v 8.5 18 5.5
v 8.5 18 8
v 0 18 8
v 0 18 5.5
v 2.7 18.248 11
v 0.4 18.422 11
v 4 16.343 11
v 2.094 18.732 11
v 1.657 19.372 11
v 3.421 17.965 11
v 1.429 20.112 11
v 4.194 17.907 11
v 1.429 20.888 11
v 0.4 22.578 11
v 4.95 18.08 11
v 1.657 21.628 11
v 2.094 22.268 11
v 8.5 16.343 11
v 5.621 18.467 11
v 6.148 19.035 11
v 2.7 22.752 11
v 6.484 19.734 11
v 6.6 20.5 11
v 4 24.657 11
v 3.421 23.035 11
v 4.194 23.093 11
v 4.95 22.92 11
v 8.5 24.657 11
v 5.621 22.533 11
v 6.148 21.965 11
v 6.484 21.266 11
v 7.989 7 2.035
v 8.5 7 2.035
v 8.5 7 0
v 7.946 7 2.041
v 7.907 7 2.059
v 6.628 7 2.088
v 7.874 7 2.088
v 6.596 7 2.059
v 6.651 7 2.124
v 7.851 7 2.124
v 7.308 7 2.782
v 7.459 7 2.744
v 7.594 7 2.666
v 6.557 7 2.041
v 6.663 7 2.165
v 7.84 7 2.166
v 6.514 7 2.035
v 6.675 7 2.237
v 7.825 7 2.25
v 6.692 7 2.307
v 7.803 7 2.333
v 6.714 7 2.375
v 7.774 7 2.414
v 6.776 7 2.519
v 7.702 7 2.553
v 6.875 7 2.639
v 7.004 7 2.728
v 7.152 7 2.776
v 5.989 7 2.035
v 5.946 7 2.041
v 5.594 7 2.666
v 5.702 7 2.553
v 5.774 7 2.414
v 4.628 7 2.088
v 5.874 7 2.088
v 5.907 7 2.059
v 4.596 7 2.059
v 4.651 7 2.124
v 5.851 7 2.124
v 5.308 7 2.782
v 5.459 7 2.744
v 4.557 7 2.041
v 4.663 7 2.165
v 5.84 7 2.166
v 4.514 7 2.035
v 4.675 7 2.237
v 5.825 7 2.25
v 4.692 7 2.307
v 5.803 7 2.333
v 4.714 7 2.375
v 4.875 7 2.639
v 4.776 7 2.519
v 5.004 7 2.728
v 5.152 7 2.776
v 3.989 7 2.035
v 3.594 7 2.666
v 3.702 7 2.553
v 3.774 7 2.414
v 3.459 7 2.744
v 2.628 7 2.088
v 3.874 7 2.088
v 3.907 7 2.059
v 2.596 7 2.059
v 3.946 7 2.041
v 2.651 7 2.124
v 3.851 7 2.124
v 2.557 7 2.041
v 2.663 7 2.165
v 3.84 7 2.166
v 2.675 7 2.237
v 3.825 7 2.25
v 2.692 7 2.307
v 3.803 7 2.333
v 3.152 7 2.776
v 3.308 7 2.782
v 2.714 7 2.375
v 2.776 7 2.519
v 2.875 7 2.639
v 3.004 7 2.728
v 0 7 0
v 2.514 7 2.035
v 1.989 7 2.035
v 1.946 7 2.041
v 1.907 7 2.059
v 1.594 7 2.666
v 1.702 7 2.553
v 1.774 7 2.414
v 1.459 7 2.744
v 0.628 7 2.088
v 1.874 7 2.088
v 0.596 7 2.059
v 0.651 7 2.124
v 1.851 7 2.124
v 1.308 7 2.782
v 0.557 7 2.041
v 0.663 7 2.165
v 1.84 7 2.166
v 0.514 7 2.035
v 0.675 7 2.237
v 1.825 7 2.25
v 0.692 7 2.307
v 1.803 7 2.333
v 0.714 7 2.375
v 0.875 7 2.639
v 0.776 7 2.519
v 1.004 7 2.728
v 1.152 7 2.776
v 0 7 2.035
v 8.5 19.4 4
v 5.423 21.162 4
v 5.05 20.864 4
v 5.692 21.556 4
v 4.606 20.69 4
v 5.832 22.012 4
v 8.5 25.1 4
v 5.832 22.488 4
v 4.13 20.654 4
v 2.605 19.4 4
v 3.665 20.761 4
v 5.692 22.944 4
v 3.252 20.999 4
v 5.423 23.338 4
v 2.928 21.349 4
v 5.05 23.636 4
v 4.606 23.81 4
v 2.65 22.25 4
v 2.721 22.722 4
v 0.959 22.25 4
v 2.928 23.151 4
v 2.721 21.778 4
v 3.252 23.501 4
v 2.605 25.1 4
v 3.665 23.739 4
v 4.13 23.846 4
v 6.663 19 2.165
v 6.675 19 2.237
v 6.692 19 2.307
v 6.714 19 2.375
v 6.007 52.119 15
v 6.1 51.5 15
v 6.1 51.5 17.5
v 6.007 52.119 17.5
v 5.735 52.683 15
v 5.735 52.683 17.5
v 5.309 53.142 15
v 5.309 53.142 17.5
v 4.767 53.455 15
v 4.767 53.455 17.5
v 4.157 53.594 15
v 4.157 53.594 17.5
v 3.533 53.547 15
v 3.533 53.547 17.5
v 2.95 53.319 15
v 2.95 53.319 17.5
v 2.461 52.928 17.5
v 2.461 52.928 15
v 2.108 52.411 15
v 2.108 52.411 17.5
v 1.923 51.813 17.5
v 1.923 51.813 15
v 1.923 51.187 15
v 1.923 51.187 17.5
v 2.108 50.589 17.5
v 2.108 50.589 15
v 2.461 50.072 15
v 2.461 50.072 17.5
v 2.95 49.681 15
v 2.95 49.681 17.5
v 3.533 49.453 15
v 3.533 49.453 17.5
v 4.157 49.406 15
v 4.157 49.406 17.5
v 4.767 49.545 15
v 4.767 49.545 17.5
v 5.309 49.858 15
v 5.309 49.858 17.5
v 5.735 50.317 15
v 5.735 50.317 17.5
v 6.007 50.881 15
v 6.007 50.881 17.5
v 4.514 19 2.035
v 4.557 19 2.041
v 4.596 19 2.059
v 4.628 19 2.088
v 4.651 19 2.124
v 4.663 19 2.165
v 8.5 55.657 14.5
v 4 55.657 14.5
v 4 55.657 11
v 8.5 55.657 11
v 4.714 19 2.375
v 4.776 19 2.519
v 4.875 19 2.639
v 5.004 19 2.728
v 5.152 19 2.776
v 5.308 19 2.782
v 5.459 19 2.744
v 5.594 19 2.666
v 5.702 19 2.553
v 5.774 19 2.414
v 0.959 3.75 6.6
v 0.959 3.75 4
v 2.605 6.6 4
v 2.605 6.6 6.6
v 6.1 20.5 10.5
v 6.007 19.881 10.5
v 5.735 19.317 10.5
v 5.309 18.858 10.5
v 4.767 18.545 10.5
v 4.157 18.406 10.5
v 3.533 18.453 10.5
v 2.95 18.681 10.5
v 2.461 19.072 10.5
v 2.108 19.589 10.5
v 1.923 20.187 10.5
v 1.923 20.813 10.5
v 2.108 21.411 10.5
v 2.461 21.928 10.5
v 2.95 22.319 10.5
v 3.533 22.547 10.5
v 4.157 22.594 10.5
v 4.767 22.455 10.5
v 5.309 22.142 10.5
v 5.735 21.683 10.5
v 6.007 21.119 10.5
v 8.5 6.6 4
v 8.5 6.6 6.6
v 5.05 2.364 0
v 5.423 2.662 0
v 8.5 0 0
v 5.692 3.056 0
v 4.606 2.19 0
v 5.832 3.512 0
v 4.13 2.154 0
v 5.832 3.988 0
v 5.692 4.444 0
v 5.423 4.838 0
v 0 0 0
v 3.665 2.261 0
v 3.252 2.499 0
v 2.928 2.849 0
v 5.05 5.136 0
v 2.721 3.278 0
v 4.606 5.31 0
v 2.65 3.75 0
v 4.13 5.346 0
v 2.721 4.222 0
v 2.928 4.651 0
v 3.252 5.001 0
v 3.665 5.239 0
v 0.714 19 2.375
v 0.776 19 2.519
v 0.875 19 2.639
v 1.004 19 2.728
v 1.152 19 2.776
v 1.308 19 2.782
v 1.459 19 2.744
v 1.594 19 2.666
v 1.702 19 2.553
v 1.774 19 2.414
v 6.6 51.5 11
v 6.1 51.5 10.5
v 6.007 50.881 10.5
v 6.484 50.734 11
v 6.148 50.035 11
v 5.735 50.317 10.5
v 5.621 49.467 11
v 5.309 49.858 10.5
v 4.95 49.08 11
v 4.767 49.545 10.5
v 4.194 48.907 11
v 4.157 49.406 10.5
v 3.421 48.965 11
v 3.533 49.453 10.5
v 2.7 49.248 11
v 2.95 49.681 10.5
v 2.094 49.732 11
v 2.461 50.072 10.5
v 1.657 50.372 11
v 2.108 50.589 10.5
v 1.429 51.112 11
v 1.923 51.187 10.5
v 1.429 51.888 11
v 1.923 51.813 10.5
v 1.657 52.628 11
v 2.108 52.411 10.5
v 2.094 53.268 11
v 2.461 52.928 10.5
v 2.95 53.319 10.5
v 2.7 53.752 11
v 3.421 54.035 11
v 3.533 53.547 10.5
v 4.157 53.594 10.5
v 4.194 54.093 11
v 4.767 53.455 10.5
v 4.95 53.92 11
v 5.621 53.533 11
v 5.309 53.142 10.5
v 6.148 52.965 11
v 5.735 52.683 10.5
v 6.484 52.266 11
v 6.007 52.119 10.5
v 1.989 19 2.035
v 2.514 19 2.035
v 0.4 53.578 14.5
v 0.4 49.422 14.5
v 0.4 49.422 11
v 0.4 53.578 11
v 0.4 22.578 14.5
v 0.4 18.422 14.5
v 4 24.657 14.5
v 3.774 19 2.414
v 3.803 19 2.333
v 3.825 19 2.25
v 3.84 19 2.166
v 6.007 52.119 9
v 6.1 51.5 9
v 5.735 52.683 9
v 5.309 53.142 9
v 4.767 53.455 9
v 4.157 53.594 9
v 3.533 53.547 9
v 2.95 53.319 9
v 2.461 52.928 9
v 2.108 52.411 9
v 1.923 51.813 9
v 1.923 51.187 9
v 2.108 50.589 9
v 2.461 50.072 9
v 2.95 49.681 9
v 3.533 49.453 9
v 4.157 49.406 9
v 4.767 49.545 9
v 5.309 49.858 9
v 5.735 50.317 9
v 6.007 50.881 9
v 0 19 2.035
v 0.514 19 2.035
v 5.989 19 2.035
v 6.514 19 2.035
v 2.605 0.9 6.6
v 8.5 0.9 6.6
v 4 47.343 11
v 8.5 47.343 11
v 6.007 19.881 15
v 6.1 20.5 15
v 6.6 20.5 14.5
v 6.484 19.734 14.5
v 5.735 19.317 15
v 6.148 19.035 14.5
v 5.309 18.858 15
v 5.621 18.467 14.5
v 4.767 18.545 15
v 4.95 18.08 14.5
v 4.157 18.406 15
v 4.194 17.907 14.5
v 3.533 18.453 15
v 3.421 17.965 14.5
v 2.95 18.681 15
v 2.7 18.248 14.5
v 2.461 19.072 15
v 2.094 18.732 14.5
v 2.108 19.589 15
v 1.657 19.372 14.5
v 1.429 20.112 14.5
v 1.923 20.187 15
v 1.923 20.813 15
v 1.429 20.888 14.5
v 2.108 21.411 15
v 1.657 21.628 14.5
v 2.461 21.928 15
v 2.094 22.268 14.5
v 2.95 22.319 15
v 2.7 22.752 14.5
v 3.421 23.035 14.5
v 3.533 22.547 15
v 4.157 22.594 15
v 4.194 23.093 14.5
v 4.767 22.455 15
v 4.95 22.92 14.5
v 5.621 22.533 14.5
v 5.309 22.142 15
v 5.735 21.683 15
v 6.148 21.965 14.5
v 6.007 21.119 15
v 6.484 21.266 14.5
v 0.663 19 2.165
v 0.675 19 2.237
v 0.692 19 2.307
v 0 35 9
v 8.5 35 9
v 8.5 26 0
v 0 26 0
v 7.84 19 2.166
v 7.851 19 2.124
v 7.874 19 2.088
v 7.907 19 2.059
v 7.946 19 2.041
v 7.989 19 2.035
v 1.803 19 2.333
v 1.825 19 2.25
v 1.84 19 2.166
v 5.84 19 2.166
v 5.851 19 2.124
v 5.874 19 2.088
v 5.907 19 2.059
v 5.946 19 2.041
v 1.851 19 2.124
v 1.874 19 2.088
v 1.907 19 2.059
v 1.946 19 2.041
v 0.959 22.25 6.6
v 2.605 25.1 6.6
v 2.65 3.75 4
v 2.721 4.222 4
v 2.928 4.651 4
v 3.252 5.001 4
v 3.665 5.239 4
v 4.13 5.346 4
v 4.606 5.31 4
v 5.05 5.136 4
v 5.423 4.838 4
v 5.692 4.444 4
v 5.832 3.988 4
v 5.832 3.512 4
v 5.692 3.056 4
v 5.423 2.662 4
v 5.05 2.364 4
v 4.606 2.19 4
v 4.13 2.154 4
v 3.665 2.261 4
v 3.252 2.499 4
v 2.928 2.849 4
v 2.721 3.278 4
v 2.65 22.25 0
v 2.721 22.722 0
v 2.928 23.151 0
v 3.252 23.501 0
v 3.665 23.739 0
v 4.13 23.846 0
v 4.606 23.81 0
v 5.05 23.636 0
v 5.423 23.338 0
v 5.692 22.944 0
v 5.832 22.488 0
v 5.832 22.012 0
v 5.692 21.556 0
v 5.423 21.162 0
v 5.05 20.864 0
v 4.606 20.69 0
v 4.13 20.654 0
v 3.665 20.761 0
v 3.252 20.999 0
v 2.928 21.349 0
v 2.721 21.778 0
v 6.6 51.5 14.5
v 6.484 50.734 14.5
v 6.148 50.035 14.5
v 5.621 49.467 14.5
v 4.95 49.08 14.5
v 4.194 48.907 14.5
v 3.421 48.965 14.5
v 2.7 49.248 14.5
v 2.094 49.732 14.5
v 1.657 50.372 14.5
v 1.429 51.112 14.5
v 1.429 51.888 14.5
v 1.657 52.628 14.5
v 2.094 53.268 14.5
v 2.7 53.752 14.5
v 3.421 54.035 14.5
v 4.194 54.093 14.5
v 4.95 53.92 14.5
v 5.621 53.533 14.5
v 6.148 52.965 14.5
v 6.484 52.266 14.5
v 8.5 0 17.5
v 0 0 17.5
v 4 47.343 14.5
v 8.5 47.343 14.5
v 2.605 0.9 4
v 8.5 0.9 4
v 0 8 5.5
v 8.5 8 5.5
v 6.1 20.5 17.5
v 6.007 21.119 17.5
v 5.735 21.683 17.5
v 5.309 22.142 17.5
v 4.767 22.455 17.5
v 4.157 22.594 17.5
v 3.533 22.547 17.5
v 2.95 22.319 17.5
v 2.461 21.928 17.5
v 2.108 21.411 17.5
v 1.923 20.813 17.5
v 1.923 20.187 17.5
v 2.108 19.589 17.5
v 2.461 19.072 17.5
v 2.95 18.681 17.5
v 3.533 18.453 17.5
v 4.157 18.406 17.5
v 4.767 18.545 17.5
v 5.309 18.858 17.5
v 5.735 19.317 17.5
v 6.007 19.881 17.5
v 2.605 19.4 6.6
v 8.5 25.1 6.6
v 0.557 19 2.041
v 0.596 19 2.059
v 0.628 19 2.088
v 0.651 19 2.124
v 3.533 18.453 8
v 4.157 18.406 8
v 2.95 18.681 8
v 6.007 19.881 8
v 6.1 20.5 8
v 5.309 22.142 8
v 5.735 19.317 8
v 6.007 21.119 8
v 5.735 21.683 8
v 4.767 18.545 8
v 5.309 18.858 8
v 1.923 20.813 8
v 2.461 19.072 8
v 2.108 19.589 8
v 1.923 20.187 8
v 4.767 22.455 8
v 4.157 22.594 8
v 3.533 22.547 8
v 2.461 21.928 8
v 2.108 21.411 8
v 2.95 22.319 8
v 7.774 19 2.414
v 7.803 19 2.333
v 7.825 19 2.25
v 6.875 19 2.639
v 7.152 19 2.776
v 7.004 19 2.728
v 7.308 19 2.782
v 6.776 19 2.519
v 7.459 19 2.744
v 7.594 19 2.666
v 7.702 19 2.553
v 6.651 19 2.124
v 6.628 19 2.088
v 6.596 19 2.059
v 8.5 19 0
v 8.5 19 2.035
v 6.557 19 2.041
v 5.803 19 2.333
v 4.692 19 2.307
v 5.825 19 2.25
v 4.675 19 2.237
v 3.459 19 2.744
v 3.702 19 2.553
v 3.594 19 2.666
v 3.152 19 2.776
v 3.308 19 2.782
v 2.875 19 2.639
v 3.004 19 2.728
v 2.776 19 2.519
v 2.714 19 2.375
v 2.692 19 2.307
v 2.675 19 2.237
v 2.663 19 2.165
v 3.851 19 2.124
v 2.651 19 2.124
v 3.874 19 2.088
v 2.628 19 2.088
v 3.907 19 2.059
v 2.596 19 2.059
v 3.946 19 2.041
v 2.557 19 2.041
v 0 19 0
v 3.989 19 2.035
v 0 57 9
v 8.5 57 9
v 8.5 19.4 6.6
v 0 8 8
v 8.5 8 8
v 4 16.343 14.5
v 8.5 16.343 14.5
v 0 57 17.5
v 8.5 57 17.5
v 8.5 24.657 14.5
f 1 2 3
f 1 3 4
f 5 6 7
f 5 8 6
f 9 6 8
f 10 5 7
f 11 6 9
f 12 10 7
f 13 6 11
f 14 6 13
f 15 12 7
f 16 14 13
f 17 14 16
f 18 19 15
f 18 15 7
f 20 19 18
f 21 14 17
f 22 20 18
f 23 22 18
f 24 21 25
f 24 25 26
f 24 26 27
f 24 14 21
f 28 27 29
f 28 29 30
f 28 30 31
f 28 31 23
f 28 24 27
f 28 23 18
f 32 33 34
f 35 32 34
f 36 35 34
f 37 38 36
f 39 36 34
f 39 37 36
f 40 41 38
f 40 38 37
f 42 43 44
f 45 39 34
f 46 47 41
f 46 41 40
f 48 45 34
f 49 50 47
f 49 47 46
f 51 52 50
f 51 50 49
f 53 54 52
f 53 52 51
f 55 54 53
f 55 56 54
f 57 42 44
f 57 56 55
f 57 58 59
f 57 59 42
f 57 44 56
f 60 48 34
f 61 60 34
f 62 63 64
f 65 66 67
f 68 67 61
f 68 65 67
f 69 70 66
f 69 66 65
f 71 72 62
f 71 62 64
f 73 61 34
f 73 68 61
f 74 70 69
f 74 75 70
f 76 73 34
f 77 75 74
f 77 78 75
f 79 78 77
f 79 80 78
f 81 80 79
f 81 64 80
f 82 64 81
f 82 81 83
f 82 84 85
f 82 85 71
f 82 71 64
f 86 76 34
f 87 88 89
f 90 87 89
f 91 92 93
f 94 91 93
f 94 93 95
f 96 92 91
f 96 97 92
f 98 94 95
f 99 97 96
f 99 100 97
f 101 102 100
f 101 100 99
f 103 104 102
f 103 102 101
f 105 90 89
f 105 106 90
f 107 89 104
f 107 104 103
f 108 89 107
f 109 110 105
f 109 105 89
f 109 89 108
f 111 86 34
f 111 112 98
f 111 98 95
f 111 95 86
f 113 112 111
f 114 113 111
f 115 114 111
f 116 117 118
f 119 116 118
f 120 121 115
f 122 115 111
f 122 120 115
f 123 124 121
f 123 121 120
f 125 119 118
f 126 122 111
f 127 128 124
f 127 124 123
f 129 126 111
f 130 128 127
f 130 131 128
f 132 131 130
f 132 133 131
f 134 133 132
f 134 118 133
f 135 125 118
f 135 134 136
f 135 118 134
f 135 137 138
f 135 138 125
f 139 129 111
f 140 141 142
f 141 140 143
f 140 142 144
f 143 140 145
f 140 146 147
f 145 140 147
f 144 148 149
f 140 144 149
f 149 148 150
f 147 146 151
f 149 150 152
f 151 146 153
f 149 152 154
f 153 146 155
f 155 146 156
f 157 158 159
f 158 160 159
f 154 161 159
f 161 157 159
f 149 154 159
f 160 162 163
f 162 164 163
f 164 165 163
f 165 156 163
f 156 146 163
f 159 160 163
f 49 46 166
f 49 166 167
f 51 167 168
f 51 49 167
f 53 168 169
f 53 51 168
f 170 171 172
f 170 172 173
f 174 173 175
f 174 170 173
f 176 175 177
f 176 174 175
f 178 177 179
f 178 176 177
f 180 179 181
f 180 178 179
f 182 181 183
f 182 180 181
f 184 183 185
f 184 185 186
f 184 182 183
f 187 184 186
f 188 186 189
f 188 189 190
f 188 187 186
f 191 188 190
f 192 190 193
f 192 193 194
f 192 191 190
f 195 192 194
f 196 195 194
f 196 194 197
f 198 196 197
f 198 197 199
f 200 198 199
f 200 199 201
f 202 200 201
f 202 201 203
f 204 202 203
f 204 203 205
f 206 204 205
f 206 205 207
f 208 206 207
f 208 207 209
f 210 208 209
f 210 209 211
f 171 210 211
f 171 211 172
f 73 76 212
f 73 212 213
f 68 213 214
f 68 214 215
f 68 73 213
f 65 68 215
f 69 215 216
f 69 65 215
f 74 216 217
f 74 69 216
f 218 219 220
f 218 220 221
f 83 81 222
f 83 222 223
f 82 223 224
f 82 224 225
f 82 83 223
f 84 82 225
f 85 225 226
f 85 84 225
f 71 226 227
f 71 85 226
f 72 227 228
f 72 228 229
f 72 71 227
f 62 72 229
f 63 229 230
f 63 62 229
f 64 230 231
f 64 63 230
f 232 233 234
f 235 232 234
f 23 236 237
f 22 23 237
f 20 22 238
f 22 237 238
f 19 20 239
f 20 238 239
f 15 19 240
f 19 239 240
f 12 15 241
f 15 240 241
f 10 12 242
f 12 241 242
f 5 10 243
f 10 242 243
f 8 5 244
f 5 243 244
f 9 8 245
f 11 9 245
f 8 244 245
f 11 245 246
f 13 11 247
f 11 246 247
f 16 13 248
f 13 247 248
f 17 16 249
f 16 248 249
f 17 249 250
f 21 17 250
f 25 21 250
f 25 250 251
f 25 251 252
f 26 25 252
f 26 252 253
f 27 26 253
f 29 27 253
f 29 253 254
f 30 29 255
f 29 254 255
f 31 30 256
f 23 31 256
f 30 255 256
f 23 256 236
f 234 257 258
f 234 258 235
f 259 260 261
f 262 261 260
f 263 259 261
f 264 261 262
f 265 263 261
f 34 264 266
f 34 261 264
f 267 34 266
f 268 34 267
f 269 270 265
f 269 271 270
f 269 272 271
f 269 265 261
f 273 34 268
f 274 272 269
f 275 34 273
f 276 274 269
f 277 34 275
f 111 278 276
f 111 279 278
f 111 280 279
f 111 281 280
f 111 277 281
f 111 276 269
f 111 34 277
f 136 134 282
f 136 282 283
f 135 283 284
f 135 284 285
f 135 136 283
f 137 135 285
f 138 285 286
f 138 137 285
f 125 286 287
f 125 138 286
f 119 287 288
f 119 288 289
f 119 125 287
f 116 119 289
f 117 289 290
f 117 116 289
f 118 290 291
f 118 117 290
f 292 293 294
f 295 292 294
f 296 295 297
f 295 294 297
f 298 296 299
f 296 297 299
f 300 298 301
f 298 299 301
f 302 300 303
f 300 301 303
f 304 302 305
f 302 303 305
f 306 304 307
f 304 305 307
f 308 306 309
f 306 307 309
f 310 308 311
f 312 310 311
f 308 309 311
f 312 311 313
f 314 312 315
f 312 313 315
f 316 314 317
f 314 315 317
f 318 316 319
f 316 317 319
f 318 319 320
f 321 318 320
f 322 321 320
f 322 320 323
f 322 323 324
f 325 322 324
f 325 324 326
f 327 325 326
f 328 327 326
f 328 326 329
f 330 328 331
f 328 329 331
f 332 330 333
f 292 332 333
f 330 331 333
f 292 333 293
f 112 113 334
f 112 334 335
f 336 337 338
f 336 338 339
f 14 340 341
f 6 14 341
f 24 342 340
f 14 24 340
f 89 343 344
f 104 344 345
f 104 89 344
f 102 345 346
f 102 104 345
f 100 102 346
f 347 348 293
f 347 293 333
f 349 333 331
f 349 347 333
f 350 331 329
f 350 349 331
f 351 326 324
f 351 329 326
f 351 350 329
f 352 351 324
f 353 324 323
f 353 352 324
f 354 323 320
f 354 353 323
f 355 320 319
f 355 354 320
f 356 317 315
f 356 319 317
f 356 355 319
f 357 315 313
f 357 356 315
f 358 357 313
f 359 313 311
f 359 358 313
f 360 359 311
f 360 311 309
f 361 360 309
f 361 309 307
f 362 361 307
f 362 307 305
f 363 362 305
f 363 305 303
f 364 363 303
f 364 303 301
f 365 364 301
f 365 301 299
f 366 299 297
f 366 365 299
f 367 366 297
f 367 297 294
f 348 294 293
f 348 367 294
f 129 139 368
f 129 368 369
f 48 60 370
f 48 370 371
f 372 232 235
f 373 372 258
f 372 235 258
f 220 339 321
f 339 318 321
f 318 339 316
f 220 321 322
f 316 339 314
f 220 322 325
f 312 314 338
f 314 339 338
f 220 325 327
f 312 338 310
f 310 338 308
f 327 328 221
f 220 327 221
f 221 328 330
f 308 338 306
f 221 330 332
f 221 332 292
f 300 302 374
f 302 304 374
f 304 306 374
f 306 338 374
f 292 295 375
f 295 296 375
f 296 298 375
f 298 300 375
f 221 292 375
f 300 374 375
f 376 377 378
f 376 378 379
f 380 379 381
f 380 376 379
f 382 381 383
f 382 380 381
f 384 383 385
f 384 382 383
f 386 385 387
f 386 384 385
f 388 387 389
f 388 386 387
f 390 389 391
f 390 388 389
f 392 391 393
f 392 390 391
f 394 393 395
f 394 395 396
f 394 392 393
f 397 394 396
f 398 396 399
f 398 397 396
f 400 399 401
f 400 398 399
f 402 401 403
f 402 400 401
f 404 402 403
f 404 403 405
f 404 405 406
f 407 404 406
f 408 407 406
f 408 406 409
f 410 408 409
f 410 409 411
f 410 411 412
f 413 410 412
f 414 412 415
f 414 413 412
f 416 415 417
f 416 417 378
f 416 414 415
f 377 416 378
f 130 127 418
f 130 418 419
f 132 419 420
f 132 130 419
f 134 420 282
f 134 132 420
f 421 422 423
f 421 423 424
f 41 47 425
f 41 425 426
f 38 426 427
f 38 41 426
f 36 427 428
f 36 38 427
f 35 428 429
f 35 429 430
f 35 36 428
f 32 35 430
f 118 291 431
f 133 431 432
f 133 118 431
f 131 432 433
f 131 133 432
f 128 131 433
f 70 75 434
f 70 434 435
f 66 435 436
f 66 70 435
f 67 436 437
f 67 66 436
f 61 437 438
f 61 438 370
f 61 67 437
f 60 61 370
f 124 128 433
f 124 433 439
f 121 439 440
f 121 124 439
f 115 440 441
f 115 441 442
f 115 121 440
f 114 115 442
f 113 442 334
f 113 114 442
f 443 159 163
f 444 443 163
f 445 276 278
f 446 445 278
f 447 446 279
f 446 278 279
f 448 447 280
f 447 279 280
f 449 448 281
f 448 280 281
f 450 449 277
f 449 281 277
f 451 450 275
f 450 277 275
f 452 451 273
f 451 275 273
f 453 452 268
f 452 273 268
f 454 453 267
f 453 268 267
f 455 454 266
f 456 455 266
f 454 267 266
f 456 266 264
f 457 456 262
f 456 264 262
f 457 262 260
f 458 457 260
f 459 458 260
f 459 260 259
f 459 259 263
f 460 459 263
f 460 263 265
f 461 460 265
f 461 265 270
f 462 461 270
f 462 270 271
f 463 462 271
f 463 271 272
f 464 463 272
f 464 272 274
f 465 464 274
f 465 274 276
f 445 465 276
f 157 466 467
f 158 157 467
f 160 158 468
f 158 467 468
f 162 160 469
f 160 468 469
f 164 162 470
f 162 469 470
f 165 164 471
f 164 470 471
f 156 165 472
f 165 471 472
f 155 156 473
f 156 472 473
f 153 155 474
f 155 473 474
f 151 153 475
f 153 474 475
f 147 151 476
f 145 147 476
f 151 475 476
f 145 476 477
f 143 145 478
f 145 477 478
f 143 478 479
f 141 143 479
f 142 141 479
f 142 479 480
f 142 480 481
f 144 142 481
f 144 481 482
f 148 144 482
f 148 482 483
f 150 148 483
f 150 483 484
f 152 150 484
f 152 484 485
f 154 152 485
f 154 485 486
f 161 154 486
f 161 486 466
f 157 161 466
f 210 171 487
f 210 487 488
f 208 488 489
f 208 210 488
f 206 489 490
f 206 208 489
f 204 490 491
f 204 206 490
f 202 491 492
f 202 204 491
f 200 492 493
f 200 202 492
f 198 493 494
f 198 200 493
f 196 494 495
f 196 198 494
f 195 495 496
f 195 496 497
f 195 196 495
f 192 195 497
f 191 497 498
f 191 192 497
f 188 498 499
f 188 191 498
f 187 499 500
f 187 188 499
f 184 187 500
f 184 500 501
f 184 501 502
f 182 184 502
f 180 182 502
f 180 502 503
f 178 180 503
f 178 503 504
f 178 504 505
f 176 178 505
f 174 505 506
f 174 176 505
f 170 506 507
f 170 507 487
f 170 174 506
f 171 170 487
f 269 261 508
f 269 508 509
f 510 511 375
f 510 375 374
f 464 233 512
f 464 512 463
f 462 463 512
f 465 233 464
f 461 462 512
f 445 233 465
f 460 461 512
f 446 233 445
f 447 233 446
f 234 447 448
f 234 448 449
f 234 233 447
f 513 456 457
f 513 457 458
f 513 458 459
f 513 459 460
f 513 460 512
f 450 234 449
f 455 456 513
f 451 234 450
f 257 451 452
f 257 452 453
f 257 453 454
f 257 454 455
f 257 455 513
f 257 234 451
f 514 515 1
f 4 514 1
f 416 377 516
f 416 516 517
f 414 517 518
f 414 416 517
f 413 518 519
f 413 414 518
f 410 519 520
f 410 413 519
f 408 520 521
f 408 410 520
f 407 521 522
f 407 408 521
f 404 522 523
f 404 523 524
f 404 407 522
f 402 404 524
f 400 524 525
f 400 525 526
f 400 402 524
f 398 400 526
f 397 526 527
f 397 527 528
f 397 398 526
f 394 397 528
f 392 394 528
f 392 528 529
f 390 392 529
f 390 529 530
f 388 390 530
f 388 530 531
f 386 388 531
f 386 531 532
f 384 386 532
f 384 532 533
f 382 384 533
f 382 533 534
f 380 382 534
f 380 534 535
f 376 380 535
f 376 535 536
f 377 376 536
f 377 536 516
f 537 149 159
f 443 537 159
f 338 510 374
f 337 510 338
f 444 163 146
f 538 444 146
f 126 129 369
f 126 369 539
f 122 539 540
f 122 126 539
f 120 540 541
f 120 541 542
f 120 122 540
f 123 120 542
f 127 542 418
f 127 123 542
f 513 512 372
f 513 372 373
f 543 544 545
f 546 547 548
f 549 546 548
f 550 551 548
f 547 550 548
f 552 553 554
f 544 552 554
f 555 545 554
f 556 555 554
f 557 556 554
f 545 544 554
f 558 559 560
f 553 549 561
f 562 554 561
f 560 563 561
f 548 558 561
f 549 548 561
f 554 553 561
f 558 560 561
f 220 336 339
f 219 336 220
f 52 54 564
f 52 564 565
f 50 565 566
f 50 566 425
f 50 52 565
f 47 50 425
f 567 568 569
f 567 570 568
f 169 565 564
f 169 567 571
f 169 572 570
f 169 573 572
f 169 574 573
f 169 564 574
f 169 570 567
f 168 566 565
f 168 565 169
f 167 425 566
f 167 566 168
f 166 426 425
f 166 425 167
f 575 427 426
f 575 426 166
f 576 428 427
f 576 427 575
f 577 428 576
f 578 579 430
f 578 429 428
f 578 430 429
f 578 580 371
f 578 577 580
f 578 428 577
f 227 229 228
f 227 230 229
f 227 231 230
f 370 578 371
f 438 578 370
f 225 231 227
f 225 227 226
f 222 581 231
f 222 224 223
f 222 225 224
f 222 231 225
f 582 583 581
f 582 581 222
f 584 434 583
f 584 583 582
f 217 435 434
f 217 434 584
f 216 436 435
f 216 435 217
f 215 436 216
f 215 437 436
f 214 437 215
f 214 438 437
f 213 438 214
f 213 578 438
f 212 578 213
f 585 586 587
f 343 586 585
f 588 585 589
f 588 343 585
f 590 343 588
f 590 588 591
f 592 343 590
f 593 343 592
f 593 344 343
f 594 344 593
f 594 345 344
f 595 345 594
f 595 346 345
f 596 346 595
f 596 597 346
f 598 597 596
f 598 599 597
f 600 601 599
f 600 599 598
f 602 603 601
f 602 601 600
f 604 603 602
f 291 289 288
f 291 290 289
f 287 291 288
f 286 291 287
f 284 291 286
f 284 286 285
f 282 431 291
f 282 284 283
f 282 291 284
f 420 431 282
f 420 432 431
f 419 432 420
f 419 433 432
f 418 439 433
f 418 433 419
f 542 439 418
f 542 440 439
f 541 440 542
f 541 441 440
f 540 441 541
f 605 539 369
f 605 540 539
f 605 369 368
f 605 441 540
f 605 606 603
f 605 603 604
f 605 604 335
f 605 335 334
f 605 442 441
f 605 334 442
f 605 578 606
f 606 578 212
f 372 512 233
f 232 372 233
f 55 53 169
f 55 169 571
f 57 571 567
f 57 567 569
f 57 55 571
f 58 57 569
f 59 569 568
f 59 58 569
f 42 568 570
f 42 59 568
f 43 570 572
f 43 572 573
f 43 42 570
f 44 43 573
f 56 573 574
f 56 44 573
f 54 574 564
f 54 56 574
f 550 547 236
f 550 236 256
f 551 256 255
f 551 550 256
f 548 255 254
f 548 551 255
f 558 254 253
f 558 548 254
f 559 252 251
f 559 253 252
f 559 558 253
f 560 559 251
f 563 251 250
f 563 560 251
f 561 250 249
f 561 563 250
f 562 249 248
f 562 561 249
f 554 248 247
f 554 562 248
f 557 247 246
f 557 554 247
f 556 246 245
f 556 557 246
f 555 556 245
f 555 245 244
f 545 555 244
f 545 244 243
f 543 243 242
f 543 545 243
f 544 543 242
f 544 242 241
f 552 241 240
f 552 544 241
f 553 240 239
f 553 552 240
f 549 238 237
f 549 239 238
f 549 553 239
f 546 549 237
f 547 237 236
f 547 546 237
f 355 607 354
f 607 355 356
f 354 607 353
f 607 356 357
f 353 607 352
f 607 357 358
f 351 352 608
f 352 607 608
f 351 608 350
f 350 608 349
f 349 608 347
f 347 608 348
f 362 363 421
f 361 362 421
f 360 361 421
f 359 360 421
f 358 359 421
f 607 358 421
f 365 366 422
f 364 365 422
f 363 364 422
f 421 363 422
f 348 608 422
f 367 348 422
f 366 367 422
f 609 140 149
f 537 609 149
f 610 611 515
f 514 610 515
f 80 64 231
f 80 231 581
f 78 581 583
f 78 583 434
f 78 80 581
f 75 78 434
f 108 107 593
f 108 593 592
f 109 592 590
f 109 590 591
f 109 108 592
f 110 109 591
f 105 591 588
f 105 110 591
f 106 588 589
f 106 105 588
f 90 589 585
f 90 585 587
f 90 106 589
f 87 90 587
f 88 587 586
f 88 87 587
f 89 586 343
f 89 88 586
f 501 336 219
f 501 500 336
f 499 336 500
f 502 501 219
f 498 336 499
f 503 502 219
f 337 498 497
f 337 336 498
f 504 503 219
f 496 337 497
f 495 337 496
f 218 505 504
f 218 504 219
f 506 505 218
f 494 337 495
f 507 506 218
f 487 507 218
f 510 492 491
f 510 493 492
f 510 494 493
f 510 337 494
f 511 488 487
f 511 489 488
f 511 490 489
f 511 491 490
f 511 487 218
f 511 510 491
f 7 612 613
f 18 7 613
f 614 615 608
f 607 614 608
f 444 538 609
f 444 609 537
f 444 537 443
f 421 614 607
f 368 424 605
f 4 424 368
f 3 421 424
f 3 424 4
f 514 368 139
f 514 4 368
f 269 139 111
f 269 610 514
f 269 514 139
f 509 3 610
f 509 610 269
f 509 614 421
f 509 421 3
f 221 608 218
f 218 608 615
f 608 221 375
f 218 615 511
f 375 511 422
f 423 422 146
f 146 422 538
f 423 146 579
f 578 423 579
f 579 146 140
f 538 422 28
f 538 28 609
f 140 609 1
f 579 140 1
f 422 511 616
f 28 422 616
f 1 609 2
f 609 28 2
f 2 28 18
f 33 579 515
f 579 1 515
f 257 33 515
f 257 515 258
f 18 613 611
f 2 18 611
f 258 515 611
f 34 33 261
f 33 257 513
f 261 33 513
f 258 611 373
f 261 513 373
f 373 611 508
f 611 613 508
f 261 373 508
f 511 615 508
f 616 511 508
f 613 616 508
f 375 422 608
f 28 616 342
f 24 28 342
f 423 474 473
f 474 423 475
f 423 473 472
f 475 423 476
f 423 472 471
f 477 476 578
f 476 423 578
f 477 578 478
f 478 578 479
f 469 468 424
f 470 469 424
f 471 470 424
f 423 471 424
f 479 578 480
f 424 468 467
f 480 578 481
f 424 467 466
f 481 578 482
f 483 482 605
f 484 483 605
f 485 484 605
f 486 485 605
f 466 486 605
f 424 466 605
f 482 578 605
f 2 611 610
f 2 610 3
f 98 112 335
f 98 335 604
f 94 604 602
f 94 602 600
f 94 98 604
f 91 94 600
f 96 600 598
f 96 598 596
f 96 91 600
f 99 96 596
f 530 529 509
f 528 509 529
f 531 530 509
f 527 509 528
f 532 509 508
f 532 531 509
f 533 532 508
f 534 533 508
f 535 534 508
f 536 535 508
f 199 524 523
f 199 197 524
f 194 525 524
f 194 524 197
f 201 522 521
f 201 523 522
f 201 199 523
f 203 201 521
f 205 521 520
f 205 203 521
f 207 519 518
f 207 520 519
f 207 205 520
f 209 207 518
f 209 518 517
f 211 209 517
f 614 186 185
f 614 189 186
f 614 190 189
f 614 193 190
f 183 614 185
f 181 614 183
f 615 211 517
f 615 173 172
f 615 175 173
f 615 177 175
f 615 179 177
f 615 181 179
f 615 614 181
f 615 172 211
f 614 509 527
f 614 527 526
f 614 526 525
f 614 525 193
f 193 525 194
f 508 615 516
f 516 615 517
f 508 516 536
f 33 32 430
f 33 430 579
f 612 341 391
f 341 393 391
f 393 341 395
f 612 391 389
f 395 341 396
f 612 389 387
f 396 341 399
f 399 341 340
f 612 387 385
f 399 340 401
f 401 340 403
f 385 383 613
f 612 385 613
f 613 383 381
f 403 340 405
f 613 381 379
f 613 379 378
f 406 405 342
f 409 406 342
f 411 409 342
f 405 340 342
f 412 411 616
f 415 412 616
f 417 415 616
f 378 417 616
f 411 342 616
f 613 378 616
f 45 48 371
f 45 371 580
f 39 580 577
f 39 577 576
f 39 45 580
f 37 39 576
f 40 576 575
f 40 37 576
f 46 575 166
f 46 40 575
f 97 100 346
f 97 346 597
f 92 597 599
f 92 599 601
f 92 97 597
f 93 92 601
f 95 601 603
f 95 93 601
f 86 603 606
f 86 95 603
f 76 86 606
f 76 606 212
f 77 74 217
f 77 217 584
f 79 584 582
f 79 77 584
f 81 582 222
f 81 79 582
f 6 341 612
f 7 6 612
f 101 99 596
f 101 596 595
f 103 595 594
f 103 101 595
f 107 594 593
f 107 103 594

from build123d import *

# Parameters (mm, degrees)
ESQUISSE1_W              = 8.5
ESQUISSE1_H              = 72
ESQUISSE1_R              = 2.1
BOSS_EXTRU_1_DEPTH       = 17.5
ENL_V_START              = -3
ENL_V_MAT_EXTRU_4_DEPTH  = 3.5
ESQUISSE7_R              = 2.1
BOSS_EXTRU_3_DEPTH       = 8
ESQUISSE3_W              = 8.5
ESQUISSE3_H              = 4
ENL_V_MAT_EXTRU_3_DEPTH  = 19
BOSS_EXTRU_2_START       = -7
BOSS_EXTRU_2_DEPTH       = 12
ESQUISSE8_W              = 8.5
ESQUISSE8_H              = 7
BOSS_EXTRU_4_DEPTH       = 4
ESQUISSE9_R              = 1.6
ENL_V_MAT_EXTRU_5_DEPTH  = 5
ENL_V_START_2            = -4
ESQUISSE10_R             = 1.6
ENL_V_MAT_EXTRU_6_DEPTH  = 2.6
ESQUISSE11_R             = 1.6
ENL_V_MAT_EXTRU_7_DEPTH  = 1.6
ESQUISSE14_W             = 2.5
ESQUISSE14_H             = 10
ENL_V_MAT_EXTRU_9_DEPTH  = 17.6
CHANFREIN1_SIZE          = 0.5
ESQUISSE15_W             = 2.6
ESQUISSE15_H             = 5.7
ESQUISSE15_W_2           = 2.5
ESQUISSE15_H_2           = 10
ESQUISSE15_W_3           = 8.5
ESQUISSE15_H_3           = 15
ENL_V_MAT_EXTRU_10_DEPTH = 10
CHANFREIN2_SIZE          = 9


with BuildPart() as part:
    # Esquisse1 → Boss.-Extru.1 (new body)
    with BuildSketch(Plane.XY):
        with Locations((4.25, 36)):
            Rectangle(ESQUISSE1_W, ESQUISSE1_H)
        with Locations((4, 20.5)):
            Circle(ESQUISSE1_R, mode=Mode.SUBTRACT)
        with Locations((4, 51.5)):
            Circle(ESQUISSE1_R, mode=Mode.SUBTRACT)
    extrude(amount=BOSS_EXTRU_1_DEPTH)

    # Esquisse6 → Enlèv. mat.-Extru.4 (cut)
    with BuildSketch(Plane.XY.offset(17.5).offset(ENL_V_START)):
        Polygon((7.6, 22.578460969), (4, 24.656921938), (0.4, 22.578460969), (0.4, 18.421539031), (4, 16.343078062), (7.6, 18.421539031), align=None)
        Polygon((8.5, 24.656921938), (4, 24.656921938), (7.6, 22.578460969), (7.6, 18.421539031), (4, 16.343078062), (8.5, 16.343078062), align=None)
    enl_v_mat_extru_4 = extrude(amount=-ENL_V_MAT_EXTRU_4_DEPTH, mode=Mode.SUBTRACT)

    # Esquisse7 → Boss.-Extru.3 (add)
    with BuildSketch(Plane(origin=(0, 0, 0), x_dir=(-1, 0, 0), z_dir=(0, 0, -1))):
        with Locations((-4, 20.5)):
            Circle(ESQUISSE7_R)
    boss_extru_3 = extrude(amount=-BOSS_EXTRU_3_DEPTH)

    # Esquisse3 → Enlèv. mat.-Extru.3 (cut)
    with BuildSketch(Plane(origin=(0, 0, 0), x_dir=(-1, 0, 0), z_dir=(0, -1, 0))):
        with Locations((-4.25, -2)):
            Rectangle(ESQUISSE3_W, ESQUISSE3_H)
    enl_v_mat_extru_3 = extrude(amount=-ENL_V_MAT_EXTRU_3_DEPTH, mode=Mode.SUBTRACT)

    # Esquisse5 → Boss.-Extru.2 (add)
    with BuildSketch(Plane.XZ.offset(BOSS_EXTRU_2_START)):
        with BuildLine():
            ThreePointArc((4.662966643, 2.165487935), (4.682946936, 2.27184931), (4.714353535, 2.375413685))
            ThreePointArc((4.714353535, 2.375413685), (5.229781903, 2.78475984), (5.773646598, 2.414028307))
            ThreePointArc((5.773646598, 2.414028307), (5.814751932, 2.291920009), (5.839789089, 2.165534781))
            ThreePointArc((5.839789089, 2.165534781), (5.889607538, 2.072347427), (5.988503907, 2.035128225))
            Line((5.988503907, 2.035128225), (6.514258005, 2.035128225))
            ThreePointArc((6.514258005, 2.035128225), (6.613136609, 2.072331852), (6.662966643, 2.165487935))
            ThreePointArc((6.662966643, 2.165487935), (6.682946936, 2.27184931), (6.714353535, 2.375413685))
            ThreePointArc((6.714353535, 2.375413685), (7.229781903, 2.78475984), (7.773646598, 2.414028307))
            ThreePointArc((7.773646598, 2.414028307), (7.814751932, 2.291920009), (7.839789089, 2.165534781))
            ThreePointArc((7.839789089, 2.165534781), (7.889607538, 2.072347427), (7.988503907, 2.035128225))
            Line((7.988503907, 2.035128225), (8.5, 2.035128225))
            Line((8.5, 2.035128225), (8.5, 4))
            Line((8.5, 4), (0, 4))
            Line((0, 4), (0, 2.035128225))
            Line((0, 2.035128225), (0.514258005, 2.035128225))
            ThreePointArc((0.514258005, 2.035128225), (0.61313661, 2.072331853), (0.662966644, 2.165487937))
            ThreePointArc((0.662966644, 2.165487937), (0.682946936, 2.271849312), (0.714353535, 2.375413685))
            ThreePointArc((0.714353535, 2.375413685), (1.229781903, 2.78475984), (1.773646598, 2.414028307))
            ThreePointArc((1.773646598, 2.414028307), (1.814751932, 2.291920009), (1.839789089, 2.165534781))
            ThreePointArc((1.839789089, 2.165534781), (1.889607538, 2.072347427), (1.988503907, 2.035128225))
            Line((1.988503907, 2.035128225), (2.514258006, 2.035128225))
            ThreePointArc((2.514258006, 2.035128225), (2.613136611, 2.072331854), (2.662966644, 2.16548794))
            ThreePointArc((2.662966644, 2.16548794), (2.682946936, 2.271849313), (2.714353535, 2.375413685))
            ThreePointArc((2.714353535, 2.375413685), (3.229781903, 2.78475984), (3.773646598, 2.414028307))
            ThreePointArc((3.773646598, 2.414028307), (3.814751932, 2.291920009), (3.839789089, 2.165534781))
            ThreePointArc((3.839789089, 2.165534781), (3.889607538, 2.072347427), (3.988503907, 2.035128225))
            Line((3.988503907, 2.035128225), (4.514258005, 2.035128225))
            ThreePointArc((4.514258005, 2.035128225), (4.613136609, 2.072331852), (4.662966643, 2.165487935))
        make_face()
    boss_extru_2 = extrude(amount=-BOSS_EXTRU_2_DEPTH)

    # Esquisse8 → Boss.-Extru.4 (add)
    with BuildSketch(Plane(origin=(0, 0, 4), x_dir=(-1, 0, 0), z_dir=(0, 0, -1))):
        with Locations((-4.25, 3.5)):
            Rectangle(ESQUISSE8_W, ESQUISSE8_H)
    boss_extru_4 = extrude(amount=BOSS_EXTRU_4_DEPTH)

    # Esquisse9 → Enlèv. mat.-Extru.5 (cut)
    with BuildSketch(Plane(origin=(0, 0, 0), x_dir=(-1, 0, 0), z_dir=(0, 0, -1))):
        with Locations((-4.25, 3.75)):
            Circle(ESQUISSE9_R)
        with Locations((-4.25, 22.25)):
            Circle(ESQUISSE9_R)
    enl_v_mat_extru_5 = extrude(amount=-ENL_V_MAT_EXTRU_5_DEPTH, mode=Mode.SUBTRACT)

    # Esquisse10 → Enlèv. mat.-Extru.6 (cut)
    # profile 1 of 4: a face of its own
    with BuildSketch(Plane(origin=(0, 0, 0), x_dir=(-1, 0, 0), z_dir=(0, 0, -1)).offset(ENL_V_START_2)):
        Polygon((-2.604551733, 25.1), (-5.895448267, 25.1), (-7.540896534, 22.25), (-5.895448267, 19.4), (-2.604551733, 19.4), (-0.959103466, 22.25), align=None)
        with Locations((-4.25, 22.25)):
            Circle(ESQUISSE10_R, mode=Mode.SUBTRACT)
    # profile 2 of 4: a face of its own
    with BuildSketch(Plane(origin=(0, 0, 0), x_dir=(-1, 0, 0), z_dir=(0, 0, -1)).offset(ENL_V_START_2)):
        Polygon((-2.604551733, 6.6), (-5.895448267, 6.6), (-7.540896534, 3.75), (-5.895448267, 0.9), (-2.604551733, 0.9), (-0.959103466, 3.75), align=None)
    # profile 3 of 4: a face of its own
    with BuildSketch(Plane(origin=(0, 0, 0), x_dir=(-1, 0, 0), z_dir=(0, 0, -1)).offset(ENL_V_START_2)):
        Polygon((-8.5, 6.6), (-5.895448267, 6.6), (-7.540896534, 3.75), (-5.895448267, 0.9), (-8.5, 0.9), align=None)
    # profile 4 of 4: a face of its own
    with BuildSketch(Plane(origin=(0, 0, 0), x_dir=(-1, 0, 0), z_dir=(0, 0, -1)).offset(ENL_V_START_2)):
        Polygon((-7.540896534, 22.25), (-5.895448267, 25.1), (-8.5, 25.1), (-8.5, 19.4), (-5.895448267, 19.4), align=None)
    enl_v_mat_extru_6 = extrude(amount=-ENL_V_MAT_EXTRU_6_DEPTH, mode=Mode.SUBTRACT)

    # Esquisse11 → Enlèv. mat.-Extru.7 (cut)
    with BuildSketch(Plane(origin=(0, 0, 5), x_dir=(-1, 0, 0), z_dir=(0, 0, -1))):
        with Locations((-4.25, 22.25)):
            Circle(ESQUISSE11_R)
    enl_v_mat_extru_7 = extrude(amount=-ENL_V_MAT_EXTRU_7_DEPTH, mode=Mode.SUBTRACT)

    # Esquisse14 → Enlèv. mat.-Extru.9 (cut)
    with BuildSketch(Plane(origin=(8.5, 0, 0), x_dir=(0, 0, -1), z_dir=(1, 0, 0))):
        with Locations((-6.75, 13)):
            Rectangle(ESQUISSE14_W, ESQUISSE14_H)
    enl_v_mat_extru_9 = extrude(amount=-ENL_V_MAT_EXTRU_9_DEPTH, mode=Mode.SUBTRACT)

    # Symétrie14: Enlèv. mat.-Extru.4, Boss.-Extru.3, Enlèv. mat.-Extru.3, Boss.-Extru.2, Boss.-Extru.4, Enlèv. mat.-Extru.5, Enlèv. mat.-Extru.6, Enlèv. mat.-Extru.7, Enlèv. mat.-Extru.9 across plane
    add(enl_v_mat_extru_4.mirror(Plane(origin=(0, 36, 0), x_dir=(0, 0, 1), z_dir=(0, -1, 0))), mode=Mode.SUBTRACT)
    add(boss_extru_3.mirror(Plane(origin=(0, 36, 0), x_dir=(0, 0, 1), z_dir=(0, -1, 0))))
    add(enl_v_mat_extru_3.mirror(Plane(origin=(0, 36, 0), x_dir=(0, 0, 1), z_dir=(0, -1, 0))), mode=Mode.SUBTRACT)
    add(boss_extru_2.mirror(Plane(origin=(0, 36, 0), x_dir=(0, 0, 1), z_dir=(0, -1, 0))))
    add(boss_extru_4.mirror(Plane(origin=(0, 36, 0), x_dir=(0, 0, 1), z_dir=(0, -1, 0))))
    add(enl_v_mat_extru_5.mirror(Plane(origin=(0, 36, 0), x_dir=(0, 0, 1), z_dir=(0, -1, 0))), mode=Mode.SUBTRACT)
    add(enl_v_mat_extru_6.mirror(Plane(origin=(0, 36, 0), x_dir=(0, 0, 1), z_dir=(0, -1, 0))), mode=Mode.SUBTRACT)
    add(enl_v_mat_extru_7.mirror(Plane(origin=(0, 36, 0), x_dir=(0, 0, 1), z_dir=(0, -1, 0))), mode=Mode.SUBTRACT)
    add(enl_v_mat_extru_9.mirror(Plane(origin=(0, 36, 0), x_dir=(0, 0, 1), z_dir=(0, -1, 0))), mode=Mode.SUBTRACT)

    # Chanfrein1
    chanfrein1_edges = [part.edges().sort_by_distance(p)[0] for p in [
        (1.9, 51.5, 14.5),
        (1.9, 51.5, 11),
        (1.9, 20.5, 11),
        (1.9, 20.5, 14.5),
    ]]
    chamfer(chanfrein1_edges, length=CHANFREIN1_SIZE)

    # Esquisse15 → Enlèv. mat.-Extru.10 (cut)
    # profile 1 of 2: a face of its own
    with BuildSketch(Plane(origin=(8.5, 0, 0), x_dir=(0, 0, -1), z_dir=(1, 0, 0))):
        Polygon((-9, 26), (0, 26), (0, 53), (-2.035128225, 53), (-2.035128225, 65), (0, 65), (0, 72), (-9, 72), (-9, 57), align=None)
        with Locations((-5.3, 49.75)):
            Rectangle(ESQUISSE15_W, ESQUISSE15_H, mode=Mode.SUBTRACT)
        with Locations((-6.75, 59)):
            Rectangle(ESQUISSE15_W_2, ESQUISSE15_H_2, mode=Mode.SUBTRACT)
        with Locations((-5.3, 68.25)):
            Rectangle(ESQUISSE15_W, ESQUISSE15_H, mode=Mode.SUBTRACT)
    # profile 2 of 2: a face of its own
    with BuildSketch(Plane(origin=(8.5, 0, 0), x_dir=(0, 0, -1), z_dir=(1, 0, 0))):
        with Locations((-13.25, 64.5)):
            Rectangle(ESQUISSE15_W_3, ESQUISSE15_H_3)
    extrude(amount=-ENL_V_MAT_EXTRU_10_DEPTH, mode=Mode.SUBTRACT)


with BuildPart() as enl_v_mat_extru_10_kept_piece:
    # of the separate pieces the step leaves, the one the design keeps (enl_v_mat_extru_10_pieces_kept)
    add(part.part.solids().sort_by_distance((6.6, 20.5, 14.5))[0])

    # Chanfrein2
    chanfrein2_edges = [enl_v_mat_extru_10_kept_piece.edges().sort_by_distance(p)[0] for p in [
        (4.25, 26, 9),
    ]]
    chamfer(chanfrein2_edges, length=CHANFREIN2_SIZE - 0.0001)  # a hair under: the kernel refuses the full size


solid = enl_v_mat_extru_10_kept_piece.part
